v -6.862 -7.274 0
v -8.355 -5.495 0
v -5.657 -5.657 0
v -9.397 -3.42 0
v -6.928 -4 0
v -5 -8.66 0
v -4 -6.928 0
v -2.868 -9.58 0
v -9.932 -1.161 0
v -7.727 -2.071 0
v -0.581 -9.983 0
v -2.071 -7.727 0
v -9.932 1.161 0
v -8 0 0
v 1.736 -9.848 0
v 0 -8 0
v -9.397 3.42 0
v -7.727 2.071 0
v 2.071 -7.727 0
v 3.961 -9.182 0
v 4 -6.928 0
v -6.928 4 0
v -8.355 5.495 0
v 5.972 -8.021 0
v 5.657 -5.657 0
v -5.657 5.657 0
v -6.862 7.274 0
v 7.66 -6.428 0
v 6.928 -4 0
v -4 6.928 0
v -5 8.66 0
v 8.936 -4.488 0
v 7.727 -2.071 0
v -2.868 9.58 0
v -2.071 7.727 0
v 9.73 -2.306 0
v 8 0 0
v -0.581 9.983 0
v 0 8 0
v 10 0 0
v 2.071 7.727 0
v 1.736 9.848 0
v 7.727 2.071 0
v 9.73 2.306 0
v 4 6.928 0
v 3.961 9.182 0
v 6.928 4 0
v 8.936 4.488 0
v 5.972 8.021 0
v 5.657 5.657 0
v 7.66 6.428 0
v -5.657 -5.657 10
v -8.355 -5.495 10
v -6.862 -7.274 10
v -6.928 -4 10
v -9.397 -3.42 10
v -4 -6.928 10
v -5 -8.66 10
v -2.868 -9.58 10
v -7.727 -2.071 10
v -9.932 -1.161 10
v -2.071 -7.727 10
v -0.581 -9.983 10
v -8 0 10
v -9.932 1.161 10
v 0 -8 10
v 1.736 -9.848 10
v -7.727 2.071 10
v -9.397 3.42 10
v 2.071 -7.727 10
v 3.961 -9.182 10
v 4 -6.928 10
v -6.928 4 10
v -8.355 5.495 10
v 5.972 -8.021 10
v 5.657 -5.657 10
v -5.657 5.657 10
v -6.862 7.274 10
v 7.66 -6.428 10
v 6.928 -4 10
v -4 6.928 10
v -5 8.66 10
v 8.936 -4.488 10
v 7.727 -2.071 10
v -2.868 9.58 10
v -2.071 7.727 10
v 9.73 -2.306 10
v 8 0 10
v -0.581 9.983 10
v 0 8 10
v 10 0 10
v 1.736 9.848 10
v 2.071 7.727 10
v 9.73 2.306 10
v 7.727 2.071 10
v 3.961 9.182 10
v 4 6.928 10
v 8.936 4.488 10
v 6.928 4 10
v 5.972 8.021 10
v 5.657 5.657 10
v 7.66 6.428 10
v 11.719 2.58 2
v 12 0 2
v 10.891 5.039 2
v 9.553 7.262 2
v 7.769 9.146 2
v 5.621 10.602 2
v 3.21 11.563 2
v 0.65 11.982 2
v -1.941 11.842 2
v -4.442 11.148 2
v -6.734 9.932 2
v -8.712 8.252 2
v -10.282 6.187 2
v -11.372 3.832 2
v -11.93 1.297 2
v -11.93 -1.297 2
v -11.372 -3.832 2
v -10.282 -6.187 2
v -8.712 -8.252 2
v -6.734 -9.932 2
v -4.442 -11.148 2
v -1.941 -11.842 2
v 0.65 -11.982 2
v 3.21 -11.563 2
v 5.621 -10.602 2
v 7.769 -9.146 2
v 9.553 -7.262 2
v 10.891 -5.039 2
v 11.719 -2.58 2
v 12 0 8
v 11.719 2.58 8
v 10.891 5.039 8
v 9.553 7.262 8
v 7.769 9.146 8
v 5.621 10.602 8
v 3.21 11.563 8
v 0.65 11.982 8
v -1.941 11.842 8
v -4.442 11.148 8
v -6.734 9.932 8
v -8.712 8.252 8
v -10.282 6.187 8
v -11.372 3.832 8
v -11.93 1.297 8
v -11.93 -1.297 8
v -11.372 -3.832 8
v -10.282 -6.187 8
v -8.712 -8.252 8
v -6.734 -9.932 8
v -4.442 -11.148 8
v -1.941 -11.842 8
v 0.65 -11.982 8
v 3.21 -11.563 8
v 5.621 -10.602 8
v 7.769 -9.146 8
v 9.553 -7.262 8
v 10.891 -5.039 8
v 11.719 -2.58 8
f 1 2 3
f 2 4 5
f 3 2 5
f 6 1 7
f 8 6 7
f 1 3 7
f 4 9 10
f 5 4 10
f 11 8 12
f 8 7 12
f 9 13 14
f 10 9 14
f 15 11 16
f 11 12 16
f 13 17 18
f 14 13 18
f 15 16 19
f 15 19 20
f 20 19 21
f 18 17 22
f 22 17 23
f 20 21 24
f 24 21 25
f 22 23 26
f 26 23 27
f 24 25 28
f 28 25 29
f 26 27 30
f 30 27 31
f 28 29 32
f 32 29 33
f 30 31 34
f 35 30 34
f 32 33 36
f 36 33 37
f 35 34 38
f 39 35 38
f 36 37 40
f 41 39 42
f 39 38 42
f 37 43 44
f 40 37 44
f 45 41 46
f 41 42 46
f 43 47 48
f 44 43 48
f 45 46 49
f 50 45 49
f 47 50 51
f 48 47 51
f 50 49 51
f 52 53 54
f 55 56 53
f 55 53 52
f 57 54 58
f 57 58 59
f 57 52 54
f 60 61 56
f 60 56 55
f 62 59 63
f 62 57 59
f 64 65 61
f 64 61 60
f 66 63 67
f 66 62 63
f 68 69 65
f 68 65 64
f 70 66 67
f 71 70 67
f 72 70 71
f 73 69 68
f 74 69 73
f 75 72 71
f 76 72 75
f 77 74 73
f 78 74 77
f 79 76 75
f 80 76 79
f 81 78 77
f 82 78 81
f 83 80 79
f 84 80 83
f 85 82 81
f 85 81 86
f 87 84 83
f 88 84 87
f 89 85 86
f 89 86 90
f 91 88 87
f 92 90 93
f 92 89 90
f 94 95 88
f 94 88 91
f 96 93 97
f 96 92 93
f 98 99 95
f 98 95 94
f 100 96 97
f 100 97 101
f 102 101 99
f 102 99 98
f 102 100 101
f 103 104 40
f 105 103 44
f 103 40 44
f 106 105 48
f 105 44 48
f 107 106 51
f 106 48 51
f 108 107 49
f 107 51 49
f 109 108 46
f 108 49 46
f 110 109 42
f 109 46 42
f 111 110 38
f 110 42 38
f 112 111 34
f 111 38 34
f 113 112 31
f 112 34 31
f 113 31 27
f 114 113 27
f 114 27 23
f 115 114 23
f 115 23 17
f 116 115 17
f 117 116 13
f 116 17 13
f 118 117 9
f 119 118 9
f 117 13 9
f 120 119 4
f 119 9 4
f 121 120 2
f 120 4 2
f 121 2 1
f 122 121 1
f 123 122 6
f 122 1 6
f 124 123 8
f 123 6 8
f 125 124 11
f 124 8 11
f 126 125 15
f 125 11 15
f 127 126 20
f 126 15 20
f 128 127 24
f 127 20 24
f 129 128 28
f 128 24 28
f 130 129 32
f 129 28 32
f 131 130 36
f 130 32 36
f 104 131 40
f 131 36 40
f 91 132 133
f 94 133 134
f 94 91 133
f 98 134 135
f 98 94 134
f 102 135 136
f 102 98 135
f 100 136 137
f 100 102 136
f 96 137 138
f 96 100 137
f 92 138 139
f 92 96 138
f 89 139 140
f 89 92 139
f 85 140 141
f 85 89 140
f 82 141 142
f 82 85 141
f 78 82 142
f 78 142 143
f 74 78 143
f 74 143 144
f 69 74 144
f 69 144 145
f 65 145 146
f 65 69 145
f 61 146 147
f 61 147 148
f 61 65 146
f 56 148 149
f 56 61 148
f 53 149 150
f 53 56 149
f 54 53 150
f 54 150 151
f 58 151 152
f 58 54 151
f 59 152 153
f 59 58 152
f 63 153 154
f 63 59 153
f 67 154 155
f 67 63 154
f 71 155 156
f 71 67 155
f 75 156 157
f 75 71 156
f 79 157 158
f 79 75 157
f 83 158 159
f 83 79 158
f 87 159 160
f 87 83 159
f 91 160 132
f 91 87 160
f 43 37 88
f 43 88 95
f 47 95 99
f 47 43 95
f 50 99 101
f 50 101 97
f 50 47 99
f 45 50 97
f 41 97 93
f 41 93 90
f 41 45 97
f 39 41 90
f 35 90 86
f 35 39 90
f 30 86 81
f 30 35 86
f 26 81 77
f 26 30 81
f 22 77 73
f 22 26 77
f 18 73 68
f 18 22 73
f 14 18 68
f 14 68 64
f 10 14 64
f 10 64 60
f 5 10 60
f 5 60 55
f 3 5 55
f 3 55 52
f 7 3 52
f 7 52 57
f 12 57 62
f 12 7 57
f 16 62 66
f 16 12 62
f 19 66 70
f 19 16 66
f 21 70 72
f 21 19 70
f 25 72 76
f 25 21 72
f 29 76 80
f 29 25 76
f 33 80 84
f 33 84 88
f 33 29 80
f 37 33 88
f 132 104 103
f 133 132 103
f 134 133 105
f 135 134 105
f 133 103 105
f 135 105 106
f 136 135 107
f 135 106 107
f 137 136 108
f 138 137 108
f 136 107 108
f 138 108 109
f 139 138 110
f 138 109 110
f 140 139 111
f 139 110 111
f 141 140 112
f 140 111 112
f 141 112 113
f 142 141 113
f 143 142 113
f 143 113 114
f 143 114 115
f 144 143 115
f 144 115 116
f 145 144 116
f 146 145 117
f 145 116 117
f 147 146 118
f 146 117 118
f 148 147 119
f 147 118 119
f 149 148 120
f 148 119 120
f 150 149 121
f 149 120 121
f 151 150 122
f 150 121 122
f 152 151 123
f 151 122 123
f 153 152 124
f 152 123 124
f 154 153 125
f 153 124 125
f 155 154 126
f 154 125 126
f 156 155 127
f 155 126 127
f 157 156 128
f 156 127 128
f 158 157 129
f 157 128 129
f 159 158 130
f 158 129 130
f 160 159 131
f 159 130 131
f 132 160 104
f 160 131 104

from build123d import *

# Parameters (mm, degrees)
CYLINDER017_R     = 8
CYLINDER017_DEPTH = 10
CYLINDER016_R     = 12
CYLINDER016_DEPTH = 10
CHAMFER008_SIZE   = 2


with BuildPart() as cylindre001:
    # Cylinder017 → Cylinder017 (new body)
    with BuildSketch(Plane.XY):
        Circle(CYLINDER017_R)
    extrude(amount=CYLINDER017_DEPTH)


with BuildPart() as chamfer008:
    # Cylinder016 → Cylinder016 (new body)
    with BuildSketch(Plane.XY):
        Circle(CYLINDER016_R)
    extrude(amount=CYLINDER016_DEPTH)

    # Cut008: cut Cylindre001
    add(cylindre001.part, mode=Mode.SUBTRACT)

    # Chamfer008
    chamfer008_edges = [chamfer008.edges().sort_by_distance(p)[0] for p in [
        (-12, 0, 10),
        (-12, 0, 0),
    ]]
    chamfer(chamfer008_edges, length=CHAMFER008_SIZE)


solid = chamfer008.part
